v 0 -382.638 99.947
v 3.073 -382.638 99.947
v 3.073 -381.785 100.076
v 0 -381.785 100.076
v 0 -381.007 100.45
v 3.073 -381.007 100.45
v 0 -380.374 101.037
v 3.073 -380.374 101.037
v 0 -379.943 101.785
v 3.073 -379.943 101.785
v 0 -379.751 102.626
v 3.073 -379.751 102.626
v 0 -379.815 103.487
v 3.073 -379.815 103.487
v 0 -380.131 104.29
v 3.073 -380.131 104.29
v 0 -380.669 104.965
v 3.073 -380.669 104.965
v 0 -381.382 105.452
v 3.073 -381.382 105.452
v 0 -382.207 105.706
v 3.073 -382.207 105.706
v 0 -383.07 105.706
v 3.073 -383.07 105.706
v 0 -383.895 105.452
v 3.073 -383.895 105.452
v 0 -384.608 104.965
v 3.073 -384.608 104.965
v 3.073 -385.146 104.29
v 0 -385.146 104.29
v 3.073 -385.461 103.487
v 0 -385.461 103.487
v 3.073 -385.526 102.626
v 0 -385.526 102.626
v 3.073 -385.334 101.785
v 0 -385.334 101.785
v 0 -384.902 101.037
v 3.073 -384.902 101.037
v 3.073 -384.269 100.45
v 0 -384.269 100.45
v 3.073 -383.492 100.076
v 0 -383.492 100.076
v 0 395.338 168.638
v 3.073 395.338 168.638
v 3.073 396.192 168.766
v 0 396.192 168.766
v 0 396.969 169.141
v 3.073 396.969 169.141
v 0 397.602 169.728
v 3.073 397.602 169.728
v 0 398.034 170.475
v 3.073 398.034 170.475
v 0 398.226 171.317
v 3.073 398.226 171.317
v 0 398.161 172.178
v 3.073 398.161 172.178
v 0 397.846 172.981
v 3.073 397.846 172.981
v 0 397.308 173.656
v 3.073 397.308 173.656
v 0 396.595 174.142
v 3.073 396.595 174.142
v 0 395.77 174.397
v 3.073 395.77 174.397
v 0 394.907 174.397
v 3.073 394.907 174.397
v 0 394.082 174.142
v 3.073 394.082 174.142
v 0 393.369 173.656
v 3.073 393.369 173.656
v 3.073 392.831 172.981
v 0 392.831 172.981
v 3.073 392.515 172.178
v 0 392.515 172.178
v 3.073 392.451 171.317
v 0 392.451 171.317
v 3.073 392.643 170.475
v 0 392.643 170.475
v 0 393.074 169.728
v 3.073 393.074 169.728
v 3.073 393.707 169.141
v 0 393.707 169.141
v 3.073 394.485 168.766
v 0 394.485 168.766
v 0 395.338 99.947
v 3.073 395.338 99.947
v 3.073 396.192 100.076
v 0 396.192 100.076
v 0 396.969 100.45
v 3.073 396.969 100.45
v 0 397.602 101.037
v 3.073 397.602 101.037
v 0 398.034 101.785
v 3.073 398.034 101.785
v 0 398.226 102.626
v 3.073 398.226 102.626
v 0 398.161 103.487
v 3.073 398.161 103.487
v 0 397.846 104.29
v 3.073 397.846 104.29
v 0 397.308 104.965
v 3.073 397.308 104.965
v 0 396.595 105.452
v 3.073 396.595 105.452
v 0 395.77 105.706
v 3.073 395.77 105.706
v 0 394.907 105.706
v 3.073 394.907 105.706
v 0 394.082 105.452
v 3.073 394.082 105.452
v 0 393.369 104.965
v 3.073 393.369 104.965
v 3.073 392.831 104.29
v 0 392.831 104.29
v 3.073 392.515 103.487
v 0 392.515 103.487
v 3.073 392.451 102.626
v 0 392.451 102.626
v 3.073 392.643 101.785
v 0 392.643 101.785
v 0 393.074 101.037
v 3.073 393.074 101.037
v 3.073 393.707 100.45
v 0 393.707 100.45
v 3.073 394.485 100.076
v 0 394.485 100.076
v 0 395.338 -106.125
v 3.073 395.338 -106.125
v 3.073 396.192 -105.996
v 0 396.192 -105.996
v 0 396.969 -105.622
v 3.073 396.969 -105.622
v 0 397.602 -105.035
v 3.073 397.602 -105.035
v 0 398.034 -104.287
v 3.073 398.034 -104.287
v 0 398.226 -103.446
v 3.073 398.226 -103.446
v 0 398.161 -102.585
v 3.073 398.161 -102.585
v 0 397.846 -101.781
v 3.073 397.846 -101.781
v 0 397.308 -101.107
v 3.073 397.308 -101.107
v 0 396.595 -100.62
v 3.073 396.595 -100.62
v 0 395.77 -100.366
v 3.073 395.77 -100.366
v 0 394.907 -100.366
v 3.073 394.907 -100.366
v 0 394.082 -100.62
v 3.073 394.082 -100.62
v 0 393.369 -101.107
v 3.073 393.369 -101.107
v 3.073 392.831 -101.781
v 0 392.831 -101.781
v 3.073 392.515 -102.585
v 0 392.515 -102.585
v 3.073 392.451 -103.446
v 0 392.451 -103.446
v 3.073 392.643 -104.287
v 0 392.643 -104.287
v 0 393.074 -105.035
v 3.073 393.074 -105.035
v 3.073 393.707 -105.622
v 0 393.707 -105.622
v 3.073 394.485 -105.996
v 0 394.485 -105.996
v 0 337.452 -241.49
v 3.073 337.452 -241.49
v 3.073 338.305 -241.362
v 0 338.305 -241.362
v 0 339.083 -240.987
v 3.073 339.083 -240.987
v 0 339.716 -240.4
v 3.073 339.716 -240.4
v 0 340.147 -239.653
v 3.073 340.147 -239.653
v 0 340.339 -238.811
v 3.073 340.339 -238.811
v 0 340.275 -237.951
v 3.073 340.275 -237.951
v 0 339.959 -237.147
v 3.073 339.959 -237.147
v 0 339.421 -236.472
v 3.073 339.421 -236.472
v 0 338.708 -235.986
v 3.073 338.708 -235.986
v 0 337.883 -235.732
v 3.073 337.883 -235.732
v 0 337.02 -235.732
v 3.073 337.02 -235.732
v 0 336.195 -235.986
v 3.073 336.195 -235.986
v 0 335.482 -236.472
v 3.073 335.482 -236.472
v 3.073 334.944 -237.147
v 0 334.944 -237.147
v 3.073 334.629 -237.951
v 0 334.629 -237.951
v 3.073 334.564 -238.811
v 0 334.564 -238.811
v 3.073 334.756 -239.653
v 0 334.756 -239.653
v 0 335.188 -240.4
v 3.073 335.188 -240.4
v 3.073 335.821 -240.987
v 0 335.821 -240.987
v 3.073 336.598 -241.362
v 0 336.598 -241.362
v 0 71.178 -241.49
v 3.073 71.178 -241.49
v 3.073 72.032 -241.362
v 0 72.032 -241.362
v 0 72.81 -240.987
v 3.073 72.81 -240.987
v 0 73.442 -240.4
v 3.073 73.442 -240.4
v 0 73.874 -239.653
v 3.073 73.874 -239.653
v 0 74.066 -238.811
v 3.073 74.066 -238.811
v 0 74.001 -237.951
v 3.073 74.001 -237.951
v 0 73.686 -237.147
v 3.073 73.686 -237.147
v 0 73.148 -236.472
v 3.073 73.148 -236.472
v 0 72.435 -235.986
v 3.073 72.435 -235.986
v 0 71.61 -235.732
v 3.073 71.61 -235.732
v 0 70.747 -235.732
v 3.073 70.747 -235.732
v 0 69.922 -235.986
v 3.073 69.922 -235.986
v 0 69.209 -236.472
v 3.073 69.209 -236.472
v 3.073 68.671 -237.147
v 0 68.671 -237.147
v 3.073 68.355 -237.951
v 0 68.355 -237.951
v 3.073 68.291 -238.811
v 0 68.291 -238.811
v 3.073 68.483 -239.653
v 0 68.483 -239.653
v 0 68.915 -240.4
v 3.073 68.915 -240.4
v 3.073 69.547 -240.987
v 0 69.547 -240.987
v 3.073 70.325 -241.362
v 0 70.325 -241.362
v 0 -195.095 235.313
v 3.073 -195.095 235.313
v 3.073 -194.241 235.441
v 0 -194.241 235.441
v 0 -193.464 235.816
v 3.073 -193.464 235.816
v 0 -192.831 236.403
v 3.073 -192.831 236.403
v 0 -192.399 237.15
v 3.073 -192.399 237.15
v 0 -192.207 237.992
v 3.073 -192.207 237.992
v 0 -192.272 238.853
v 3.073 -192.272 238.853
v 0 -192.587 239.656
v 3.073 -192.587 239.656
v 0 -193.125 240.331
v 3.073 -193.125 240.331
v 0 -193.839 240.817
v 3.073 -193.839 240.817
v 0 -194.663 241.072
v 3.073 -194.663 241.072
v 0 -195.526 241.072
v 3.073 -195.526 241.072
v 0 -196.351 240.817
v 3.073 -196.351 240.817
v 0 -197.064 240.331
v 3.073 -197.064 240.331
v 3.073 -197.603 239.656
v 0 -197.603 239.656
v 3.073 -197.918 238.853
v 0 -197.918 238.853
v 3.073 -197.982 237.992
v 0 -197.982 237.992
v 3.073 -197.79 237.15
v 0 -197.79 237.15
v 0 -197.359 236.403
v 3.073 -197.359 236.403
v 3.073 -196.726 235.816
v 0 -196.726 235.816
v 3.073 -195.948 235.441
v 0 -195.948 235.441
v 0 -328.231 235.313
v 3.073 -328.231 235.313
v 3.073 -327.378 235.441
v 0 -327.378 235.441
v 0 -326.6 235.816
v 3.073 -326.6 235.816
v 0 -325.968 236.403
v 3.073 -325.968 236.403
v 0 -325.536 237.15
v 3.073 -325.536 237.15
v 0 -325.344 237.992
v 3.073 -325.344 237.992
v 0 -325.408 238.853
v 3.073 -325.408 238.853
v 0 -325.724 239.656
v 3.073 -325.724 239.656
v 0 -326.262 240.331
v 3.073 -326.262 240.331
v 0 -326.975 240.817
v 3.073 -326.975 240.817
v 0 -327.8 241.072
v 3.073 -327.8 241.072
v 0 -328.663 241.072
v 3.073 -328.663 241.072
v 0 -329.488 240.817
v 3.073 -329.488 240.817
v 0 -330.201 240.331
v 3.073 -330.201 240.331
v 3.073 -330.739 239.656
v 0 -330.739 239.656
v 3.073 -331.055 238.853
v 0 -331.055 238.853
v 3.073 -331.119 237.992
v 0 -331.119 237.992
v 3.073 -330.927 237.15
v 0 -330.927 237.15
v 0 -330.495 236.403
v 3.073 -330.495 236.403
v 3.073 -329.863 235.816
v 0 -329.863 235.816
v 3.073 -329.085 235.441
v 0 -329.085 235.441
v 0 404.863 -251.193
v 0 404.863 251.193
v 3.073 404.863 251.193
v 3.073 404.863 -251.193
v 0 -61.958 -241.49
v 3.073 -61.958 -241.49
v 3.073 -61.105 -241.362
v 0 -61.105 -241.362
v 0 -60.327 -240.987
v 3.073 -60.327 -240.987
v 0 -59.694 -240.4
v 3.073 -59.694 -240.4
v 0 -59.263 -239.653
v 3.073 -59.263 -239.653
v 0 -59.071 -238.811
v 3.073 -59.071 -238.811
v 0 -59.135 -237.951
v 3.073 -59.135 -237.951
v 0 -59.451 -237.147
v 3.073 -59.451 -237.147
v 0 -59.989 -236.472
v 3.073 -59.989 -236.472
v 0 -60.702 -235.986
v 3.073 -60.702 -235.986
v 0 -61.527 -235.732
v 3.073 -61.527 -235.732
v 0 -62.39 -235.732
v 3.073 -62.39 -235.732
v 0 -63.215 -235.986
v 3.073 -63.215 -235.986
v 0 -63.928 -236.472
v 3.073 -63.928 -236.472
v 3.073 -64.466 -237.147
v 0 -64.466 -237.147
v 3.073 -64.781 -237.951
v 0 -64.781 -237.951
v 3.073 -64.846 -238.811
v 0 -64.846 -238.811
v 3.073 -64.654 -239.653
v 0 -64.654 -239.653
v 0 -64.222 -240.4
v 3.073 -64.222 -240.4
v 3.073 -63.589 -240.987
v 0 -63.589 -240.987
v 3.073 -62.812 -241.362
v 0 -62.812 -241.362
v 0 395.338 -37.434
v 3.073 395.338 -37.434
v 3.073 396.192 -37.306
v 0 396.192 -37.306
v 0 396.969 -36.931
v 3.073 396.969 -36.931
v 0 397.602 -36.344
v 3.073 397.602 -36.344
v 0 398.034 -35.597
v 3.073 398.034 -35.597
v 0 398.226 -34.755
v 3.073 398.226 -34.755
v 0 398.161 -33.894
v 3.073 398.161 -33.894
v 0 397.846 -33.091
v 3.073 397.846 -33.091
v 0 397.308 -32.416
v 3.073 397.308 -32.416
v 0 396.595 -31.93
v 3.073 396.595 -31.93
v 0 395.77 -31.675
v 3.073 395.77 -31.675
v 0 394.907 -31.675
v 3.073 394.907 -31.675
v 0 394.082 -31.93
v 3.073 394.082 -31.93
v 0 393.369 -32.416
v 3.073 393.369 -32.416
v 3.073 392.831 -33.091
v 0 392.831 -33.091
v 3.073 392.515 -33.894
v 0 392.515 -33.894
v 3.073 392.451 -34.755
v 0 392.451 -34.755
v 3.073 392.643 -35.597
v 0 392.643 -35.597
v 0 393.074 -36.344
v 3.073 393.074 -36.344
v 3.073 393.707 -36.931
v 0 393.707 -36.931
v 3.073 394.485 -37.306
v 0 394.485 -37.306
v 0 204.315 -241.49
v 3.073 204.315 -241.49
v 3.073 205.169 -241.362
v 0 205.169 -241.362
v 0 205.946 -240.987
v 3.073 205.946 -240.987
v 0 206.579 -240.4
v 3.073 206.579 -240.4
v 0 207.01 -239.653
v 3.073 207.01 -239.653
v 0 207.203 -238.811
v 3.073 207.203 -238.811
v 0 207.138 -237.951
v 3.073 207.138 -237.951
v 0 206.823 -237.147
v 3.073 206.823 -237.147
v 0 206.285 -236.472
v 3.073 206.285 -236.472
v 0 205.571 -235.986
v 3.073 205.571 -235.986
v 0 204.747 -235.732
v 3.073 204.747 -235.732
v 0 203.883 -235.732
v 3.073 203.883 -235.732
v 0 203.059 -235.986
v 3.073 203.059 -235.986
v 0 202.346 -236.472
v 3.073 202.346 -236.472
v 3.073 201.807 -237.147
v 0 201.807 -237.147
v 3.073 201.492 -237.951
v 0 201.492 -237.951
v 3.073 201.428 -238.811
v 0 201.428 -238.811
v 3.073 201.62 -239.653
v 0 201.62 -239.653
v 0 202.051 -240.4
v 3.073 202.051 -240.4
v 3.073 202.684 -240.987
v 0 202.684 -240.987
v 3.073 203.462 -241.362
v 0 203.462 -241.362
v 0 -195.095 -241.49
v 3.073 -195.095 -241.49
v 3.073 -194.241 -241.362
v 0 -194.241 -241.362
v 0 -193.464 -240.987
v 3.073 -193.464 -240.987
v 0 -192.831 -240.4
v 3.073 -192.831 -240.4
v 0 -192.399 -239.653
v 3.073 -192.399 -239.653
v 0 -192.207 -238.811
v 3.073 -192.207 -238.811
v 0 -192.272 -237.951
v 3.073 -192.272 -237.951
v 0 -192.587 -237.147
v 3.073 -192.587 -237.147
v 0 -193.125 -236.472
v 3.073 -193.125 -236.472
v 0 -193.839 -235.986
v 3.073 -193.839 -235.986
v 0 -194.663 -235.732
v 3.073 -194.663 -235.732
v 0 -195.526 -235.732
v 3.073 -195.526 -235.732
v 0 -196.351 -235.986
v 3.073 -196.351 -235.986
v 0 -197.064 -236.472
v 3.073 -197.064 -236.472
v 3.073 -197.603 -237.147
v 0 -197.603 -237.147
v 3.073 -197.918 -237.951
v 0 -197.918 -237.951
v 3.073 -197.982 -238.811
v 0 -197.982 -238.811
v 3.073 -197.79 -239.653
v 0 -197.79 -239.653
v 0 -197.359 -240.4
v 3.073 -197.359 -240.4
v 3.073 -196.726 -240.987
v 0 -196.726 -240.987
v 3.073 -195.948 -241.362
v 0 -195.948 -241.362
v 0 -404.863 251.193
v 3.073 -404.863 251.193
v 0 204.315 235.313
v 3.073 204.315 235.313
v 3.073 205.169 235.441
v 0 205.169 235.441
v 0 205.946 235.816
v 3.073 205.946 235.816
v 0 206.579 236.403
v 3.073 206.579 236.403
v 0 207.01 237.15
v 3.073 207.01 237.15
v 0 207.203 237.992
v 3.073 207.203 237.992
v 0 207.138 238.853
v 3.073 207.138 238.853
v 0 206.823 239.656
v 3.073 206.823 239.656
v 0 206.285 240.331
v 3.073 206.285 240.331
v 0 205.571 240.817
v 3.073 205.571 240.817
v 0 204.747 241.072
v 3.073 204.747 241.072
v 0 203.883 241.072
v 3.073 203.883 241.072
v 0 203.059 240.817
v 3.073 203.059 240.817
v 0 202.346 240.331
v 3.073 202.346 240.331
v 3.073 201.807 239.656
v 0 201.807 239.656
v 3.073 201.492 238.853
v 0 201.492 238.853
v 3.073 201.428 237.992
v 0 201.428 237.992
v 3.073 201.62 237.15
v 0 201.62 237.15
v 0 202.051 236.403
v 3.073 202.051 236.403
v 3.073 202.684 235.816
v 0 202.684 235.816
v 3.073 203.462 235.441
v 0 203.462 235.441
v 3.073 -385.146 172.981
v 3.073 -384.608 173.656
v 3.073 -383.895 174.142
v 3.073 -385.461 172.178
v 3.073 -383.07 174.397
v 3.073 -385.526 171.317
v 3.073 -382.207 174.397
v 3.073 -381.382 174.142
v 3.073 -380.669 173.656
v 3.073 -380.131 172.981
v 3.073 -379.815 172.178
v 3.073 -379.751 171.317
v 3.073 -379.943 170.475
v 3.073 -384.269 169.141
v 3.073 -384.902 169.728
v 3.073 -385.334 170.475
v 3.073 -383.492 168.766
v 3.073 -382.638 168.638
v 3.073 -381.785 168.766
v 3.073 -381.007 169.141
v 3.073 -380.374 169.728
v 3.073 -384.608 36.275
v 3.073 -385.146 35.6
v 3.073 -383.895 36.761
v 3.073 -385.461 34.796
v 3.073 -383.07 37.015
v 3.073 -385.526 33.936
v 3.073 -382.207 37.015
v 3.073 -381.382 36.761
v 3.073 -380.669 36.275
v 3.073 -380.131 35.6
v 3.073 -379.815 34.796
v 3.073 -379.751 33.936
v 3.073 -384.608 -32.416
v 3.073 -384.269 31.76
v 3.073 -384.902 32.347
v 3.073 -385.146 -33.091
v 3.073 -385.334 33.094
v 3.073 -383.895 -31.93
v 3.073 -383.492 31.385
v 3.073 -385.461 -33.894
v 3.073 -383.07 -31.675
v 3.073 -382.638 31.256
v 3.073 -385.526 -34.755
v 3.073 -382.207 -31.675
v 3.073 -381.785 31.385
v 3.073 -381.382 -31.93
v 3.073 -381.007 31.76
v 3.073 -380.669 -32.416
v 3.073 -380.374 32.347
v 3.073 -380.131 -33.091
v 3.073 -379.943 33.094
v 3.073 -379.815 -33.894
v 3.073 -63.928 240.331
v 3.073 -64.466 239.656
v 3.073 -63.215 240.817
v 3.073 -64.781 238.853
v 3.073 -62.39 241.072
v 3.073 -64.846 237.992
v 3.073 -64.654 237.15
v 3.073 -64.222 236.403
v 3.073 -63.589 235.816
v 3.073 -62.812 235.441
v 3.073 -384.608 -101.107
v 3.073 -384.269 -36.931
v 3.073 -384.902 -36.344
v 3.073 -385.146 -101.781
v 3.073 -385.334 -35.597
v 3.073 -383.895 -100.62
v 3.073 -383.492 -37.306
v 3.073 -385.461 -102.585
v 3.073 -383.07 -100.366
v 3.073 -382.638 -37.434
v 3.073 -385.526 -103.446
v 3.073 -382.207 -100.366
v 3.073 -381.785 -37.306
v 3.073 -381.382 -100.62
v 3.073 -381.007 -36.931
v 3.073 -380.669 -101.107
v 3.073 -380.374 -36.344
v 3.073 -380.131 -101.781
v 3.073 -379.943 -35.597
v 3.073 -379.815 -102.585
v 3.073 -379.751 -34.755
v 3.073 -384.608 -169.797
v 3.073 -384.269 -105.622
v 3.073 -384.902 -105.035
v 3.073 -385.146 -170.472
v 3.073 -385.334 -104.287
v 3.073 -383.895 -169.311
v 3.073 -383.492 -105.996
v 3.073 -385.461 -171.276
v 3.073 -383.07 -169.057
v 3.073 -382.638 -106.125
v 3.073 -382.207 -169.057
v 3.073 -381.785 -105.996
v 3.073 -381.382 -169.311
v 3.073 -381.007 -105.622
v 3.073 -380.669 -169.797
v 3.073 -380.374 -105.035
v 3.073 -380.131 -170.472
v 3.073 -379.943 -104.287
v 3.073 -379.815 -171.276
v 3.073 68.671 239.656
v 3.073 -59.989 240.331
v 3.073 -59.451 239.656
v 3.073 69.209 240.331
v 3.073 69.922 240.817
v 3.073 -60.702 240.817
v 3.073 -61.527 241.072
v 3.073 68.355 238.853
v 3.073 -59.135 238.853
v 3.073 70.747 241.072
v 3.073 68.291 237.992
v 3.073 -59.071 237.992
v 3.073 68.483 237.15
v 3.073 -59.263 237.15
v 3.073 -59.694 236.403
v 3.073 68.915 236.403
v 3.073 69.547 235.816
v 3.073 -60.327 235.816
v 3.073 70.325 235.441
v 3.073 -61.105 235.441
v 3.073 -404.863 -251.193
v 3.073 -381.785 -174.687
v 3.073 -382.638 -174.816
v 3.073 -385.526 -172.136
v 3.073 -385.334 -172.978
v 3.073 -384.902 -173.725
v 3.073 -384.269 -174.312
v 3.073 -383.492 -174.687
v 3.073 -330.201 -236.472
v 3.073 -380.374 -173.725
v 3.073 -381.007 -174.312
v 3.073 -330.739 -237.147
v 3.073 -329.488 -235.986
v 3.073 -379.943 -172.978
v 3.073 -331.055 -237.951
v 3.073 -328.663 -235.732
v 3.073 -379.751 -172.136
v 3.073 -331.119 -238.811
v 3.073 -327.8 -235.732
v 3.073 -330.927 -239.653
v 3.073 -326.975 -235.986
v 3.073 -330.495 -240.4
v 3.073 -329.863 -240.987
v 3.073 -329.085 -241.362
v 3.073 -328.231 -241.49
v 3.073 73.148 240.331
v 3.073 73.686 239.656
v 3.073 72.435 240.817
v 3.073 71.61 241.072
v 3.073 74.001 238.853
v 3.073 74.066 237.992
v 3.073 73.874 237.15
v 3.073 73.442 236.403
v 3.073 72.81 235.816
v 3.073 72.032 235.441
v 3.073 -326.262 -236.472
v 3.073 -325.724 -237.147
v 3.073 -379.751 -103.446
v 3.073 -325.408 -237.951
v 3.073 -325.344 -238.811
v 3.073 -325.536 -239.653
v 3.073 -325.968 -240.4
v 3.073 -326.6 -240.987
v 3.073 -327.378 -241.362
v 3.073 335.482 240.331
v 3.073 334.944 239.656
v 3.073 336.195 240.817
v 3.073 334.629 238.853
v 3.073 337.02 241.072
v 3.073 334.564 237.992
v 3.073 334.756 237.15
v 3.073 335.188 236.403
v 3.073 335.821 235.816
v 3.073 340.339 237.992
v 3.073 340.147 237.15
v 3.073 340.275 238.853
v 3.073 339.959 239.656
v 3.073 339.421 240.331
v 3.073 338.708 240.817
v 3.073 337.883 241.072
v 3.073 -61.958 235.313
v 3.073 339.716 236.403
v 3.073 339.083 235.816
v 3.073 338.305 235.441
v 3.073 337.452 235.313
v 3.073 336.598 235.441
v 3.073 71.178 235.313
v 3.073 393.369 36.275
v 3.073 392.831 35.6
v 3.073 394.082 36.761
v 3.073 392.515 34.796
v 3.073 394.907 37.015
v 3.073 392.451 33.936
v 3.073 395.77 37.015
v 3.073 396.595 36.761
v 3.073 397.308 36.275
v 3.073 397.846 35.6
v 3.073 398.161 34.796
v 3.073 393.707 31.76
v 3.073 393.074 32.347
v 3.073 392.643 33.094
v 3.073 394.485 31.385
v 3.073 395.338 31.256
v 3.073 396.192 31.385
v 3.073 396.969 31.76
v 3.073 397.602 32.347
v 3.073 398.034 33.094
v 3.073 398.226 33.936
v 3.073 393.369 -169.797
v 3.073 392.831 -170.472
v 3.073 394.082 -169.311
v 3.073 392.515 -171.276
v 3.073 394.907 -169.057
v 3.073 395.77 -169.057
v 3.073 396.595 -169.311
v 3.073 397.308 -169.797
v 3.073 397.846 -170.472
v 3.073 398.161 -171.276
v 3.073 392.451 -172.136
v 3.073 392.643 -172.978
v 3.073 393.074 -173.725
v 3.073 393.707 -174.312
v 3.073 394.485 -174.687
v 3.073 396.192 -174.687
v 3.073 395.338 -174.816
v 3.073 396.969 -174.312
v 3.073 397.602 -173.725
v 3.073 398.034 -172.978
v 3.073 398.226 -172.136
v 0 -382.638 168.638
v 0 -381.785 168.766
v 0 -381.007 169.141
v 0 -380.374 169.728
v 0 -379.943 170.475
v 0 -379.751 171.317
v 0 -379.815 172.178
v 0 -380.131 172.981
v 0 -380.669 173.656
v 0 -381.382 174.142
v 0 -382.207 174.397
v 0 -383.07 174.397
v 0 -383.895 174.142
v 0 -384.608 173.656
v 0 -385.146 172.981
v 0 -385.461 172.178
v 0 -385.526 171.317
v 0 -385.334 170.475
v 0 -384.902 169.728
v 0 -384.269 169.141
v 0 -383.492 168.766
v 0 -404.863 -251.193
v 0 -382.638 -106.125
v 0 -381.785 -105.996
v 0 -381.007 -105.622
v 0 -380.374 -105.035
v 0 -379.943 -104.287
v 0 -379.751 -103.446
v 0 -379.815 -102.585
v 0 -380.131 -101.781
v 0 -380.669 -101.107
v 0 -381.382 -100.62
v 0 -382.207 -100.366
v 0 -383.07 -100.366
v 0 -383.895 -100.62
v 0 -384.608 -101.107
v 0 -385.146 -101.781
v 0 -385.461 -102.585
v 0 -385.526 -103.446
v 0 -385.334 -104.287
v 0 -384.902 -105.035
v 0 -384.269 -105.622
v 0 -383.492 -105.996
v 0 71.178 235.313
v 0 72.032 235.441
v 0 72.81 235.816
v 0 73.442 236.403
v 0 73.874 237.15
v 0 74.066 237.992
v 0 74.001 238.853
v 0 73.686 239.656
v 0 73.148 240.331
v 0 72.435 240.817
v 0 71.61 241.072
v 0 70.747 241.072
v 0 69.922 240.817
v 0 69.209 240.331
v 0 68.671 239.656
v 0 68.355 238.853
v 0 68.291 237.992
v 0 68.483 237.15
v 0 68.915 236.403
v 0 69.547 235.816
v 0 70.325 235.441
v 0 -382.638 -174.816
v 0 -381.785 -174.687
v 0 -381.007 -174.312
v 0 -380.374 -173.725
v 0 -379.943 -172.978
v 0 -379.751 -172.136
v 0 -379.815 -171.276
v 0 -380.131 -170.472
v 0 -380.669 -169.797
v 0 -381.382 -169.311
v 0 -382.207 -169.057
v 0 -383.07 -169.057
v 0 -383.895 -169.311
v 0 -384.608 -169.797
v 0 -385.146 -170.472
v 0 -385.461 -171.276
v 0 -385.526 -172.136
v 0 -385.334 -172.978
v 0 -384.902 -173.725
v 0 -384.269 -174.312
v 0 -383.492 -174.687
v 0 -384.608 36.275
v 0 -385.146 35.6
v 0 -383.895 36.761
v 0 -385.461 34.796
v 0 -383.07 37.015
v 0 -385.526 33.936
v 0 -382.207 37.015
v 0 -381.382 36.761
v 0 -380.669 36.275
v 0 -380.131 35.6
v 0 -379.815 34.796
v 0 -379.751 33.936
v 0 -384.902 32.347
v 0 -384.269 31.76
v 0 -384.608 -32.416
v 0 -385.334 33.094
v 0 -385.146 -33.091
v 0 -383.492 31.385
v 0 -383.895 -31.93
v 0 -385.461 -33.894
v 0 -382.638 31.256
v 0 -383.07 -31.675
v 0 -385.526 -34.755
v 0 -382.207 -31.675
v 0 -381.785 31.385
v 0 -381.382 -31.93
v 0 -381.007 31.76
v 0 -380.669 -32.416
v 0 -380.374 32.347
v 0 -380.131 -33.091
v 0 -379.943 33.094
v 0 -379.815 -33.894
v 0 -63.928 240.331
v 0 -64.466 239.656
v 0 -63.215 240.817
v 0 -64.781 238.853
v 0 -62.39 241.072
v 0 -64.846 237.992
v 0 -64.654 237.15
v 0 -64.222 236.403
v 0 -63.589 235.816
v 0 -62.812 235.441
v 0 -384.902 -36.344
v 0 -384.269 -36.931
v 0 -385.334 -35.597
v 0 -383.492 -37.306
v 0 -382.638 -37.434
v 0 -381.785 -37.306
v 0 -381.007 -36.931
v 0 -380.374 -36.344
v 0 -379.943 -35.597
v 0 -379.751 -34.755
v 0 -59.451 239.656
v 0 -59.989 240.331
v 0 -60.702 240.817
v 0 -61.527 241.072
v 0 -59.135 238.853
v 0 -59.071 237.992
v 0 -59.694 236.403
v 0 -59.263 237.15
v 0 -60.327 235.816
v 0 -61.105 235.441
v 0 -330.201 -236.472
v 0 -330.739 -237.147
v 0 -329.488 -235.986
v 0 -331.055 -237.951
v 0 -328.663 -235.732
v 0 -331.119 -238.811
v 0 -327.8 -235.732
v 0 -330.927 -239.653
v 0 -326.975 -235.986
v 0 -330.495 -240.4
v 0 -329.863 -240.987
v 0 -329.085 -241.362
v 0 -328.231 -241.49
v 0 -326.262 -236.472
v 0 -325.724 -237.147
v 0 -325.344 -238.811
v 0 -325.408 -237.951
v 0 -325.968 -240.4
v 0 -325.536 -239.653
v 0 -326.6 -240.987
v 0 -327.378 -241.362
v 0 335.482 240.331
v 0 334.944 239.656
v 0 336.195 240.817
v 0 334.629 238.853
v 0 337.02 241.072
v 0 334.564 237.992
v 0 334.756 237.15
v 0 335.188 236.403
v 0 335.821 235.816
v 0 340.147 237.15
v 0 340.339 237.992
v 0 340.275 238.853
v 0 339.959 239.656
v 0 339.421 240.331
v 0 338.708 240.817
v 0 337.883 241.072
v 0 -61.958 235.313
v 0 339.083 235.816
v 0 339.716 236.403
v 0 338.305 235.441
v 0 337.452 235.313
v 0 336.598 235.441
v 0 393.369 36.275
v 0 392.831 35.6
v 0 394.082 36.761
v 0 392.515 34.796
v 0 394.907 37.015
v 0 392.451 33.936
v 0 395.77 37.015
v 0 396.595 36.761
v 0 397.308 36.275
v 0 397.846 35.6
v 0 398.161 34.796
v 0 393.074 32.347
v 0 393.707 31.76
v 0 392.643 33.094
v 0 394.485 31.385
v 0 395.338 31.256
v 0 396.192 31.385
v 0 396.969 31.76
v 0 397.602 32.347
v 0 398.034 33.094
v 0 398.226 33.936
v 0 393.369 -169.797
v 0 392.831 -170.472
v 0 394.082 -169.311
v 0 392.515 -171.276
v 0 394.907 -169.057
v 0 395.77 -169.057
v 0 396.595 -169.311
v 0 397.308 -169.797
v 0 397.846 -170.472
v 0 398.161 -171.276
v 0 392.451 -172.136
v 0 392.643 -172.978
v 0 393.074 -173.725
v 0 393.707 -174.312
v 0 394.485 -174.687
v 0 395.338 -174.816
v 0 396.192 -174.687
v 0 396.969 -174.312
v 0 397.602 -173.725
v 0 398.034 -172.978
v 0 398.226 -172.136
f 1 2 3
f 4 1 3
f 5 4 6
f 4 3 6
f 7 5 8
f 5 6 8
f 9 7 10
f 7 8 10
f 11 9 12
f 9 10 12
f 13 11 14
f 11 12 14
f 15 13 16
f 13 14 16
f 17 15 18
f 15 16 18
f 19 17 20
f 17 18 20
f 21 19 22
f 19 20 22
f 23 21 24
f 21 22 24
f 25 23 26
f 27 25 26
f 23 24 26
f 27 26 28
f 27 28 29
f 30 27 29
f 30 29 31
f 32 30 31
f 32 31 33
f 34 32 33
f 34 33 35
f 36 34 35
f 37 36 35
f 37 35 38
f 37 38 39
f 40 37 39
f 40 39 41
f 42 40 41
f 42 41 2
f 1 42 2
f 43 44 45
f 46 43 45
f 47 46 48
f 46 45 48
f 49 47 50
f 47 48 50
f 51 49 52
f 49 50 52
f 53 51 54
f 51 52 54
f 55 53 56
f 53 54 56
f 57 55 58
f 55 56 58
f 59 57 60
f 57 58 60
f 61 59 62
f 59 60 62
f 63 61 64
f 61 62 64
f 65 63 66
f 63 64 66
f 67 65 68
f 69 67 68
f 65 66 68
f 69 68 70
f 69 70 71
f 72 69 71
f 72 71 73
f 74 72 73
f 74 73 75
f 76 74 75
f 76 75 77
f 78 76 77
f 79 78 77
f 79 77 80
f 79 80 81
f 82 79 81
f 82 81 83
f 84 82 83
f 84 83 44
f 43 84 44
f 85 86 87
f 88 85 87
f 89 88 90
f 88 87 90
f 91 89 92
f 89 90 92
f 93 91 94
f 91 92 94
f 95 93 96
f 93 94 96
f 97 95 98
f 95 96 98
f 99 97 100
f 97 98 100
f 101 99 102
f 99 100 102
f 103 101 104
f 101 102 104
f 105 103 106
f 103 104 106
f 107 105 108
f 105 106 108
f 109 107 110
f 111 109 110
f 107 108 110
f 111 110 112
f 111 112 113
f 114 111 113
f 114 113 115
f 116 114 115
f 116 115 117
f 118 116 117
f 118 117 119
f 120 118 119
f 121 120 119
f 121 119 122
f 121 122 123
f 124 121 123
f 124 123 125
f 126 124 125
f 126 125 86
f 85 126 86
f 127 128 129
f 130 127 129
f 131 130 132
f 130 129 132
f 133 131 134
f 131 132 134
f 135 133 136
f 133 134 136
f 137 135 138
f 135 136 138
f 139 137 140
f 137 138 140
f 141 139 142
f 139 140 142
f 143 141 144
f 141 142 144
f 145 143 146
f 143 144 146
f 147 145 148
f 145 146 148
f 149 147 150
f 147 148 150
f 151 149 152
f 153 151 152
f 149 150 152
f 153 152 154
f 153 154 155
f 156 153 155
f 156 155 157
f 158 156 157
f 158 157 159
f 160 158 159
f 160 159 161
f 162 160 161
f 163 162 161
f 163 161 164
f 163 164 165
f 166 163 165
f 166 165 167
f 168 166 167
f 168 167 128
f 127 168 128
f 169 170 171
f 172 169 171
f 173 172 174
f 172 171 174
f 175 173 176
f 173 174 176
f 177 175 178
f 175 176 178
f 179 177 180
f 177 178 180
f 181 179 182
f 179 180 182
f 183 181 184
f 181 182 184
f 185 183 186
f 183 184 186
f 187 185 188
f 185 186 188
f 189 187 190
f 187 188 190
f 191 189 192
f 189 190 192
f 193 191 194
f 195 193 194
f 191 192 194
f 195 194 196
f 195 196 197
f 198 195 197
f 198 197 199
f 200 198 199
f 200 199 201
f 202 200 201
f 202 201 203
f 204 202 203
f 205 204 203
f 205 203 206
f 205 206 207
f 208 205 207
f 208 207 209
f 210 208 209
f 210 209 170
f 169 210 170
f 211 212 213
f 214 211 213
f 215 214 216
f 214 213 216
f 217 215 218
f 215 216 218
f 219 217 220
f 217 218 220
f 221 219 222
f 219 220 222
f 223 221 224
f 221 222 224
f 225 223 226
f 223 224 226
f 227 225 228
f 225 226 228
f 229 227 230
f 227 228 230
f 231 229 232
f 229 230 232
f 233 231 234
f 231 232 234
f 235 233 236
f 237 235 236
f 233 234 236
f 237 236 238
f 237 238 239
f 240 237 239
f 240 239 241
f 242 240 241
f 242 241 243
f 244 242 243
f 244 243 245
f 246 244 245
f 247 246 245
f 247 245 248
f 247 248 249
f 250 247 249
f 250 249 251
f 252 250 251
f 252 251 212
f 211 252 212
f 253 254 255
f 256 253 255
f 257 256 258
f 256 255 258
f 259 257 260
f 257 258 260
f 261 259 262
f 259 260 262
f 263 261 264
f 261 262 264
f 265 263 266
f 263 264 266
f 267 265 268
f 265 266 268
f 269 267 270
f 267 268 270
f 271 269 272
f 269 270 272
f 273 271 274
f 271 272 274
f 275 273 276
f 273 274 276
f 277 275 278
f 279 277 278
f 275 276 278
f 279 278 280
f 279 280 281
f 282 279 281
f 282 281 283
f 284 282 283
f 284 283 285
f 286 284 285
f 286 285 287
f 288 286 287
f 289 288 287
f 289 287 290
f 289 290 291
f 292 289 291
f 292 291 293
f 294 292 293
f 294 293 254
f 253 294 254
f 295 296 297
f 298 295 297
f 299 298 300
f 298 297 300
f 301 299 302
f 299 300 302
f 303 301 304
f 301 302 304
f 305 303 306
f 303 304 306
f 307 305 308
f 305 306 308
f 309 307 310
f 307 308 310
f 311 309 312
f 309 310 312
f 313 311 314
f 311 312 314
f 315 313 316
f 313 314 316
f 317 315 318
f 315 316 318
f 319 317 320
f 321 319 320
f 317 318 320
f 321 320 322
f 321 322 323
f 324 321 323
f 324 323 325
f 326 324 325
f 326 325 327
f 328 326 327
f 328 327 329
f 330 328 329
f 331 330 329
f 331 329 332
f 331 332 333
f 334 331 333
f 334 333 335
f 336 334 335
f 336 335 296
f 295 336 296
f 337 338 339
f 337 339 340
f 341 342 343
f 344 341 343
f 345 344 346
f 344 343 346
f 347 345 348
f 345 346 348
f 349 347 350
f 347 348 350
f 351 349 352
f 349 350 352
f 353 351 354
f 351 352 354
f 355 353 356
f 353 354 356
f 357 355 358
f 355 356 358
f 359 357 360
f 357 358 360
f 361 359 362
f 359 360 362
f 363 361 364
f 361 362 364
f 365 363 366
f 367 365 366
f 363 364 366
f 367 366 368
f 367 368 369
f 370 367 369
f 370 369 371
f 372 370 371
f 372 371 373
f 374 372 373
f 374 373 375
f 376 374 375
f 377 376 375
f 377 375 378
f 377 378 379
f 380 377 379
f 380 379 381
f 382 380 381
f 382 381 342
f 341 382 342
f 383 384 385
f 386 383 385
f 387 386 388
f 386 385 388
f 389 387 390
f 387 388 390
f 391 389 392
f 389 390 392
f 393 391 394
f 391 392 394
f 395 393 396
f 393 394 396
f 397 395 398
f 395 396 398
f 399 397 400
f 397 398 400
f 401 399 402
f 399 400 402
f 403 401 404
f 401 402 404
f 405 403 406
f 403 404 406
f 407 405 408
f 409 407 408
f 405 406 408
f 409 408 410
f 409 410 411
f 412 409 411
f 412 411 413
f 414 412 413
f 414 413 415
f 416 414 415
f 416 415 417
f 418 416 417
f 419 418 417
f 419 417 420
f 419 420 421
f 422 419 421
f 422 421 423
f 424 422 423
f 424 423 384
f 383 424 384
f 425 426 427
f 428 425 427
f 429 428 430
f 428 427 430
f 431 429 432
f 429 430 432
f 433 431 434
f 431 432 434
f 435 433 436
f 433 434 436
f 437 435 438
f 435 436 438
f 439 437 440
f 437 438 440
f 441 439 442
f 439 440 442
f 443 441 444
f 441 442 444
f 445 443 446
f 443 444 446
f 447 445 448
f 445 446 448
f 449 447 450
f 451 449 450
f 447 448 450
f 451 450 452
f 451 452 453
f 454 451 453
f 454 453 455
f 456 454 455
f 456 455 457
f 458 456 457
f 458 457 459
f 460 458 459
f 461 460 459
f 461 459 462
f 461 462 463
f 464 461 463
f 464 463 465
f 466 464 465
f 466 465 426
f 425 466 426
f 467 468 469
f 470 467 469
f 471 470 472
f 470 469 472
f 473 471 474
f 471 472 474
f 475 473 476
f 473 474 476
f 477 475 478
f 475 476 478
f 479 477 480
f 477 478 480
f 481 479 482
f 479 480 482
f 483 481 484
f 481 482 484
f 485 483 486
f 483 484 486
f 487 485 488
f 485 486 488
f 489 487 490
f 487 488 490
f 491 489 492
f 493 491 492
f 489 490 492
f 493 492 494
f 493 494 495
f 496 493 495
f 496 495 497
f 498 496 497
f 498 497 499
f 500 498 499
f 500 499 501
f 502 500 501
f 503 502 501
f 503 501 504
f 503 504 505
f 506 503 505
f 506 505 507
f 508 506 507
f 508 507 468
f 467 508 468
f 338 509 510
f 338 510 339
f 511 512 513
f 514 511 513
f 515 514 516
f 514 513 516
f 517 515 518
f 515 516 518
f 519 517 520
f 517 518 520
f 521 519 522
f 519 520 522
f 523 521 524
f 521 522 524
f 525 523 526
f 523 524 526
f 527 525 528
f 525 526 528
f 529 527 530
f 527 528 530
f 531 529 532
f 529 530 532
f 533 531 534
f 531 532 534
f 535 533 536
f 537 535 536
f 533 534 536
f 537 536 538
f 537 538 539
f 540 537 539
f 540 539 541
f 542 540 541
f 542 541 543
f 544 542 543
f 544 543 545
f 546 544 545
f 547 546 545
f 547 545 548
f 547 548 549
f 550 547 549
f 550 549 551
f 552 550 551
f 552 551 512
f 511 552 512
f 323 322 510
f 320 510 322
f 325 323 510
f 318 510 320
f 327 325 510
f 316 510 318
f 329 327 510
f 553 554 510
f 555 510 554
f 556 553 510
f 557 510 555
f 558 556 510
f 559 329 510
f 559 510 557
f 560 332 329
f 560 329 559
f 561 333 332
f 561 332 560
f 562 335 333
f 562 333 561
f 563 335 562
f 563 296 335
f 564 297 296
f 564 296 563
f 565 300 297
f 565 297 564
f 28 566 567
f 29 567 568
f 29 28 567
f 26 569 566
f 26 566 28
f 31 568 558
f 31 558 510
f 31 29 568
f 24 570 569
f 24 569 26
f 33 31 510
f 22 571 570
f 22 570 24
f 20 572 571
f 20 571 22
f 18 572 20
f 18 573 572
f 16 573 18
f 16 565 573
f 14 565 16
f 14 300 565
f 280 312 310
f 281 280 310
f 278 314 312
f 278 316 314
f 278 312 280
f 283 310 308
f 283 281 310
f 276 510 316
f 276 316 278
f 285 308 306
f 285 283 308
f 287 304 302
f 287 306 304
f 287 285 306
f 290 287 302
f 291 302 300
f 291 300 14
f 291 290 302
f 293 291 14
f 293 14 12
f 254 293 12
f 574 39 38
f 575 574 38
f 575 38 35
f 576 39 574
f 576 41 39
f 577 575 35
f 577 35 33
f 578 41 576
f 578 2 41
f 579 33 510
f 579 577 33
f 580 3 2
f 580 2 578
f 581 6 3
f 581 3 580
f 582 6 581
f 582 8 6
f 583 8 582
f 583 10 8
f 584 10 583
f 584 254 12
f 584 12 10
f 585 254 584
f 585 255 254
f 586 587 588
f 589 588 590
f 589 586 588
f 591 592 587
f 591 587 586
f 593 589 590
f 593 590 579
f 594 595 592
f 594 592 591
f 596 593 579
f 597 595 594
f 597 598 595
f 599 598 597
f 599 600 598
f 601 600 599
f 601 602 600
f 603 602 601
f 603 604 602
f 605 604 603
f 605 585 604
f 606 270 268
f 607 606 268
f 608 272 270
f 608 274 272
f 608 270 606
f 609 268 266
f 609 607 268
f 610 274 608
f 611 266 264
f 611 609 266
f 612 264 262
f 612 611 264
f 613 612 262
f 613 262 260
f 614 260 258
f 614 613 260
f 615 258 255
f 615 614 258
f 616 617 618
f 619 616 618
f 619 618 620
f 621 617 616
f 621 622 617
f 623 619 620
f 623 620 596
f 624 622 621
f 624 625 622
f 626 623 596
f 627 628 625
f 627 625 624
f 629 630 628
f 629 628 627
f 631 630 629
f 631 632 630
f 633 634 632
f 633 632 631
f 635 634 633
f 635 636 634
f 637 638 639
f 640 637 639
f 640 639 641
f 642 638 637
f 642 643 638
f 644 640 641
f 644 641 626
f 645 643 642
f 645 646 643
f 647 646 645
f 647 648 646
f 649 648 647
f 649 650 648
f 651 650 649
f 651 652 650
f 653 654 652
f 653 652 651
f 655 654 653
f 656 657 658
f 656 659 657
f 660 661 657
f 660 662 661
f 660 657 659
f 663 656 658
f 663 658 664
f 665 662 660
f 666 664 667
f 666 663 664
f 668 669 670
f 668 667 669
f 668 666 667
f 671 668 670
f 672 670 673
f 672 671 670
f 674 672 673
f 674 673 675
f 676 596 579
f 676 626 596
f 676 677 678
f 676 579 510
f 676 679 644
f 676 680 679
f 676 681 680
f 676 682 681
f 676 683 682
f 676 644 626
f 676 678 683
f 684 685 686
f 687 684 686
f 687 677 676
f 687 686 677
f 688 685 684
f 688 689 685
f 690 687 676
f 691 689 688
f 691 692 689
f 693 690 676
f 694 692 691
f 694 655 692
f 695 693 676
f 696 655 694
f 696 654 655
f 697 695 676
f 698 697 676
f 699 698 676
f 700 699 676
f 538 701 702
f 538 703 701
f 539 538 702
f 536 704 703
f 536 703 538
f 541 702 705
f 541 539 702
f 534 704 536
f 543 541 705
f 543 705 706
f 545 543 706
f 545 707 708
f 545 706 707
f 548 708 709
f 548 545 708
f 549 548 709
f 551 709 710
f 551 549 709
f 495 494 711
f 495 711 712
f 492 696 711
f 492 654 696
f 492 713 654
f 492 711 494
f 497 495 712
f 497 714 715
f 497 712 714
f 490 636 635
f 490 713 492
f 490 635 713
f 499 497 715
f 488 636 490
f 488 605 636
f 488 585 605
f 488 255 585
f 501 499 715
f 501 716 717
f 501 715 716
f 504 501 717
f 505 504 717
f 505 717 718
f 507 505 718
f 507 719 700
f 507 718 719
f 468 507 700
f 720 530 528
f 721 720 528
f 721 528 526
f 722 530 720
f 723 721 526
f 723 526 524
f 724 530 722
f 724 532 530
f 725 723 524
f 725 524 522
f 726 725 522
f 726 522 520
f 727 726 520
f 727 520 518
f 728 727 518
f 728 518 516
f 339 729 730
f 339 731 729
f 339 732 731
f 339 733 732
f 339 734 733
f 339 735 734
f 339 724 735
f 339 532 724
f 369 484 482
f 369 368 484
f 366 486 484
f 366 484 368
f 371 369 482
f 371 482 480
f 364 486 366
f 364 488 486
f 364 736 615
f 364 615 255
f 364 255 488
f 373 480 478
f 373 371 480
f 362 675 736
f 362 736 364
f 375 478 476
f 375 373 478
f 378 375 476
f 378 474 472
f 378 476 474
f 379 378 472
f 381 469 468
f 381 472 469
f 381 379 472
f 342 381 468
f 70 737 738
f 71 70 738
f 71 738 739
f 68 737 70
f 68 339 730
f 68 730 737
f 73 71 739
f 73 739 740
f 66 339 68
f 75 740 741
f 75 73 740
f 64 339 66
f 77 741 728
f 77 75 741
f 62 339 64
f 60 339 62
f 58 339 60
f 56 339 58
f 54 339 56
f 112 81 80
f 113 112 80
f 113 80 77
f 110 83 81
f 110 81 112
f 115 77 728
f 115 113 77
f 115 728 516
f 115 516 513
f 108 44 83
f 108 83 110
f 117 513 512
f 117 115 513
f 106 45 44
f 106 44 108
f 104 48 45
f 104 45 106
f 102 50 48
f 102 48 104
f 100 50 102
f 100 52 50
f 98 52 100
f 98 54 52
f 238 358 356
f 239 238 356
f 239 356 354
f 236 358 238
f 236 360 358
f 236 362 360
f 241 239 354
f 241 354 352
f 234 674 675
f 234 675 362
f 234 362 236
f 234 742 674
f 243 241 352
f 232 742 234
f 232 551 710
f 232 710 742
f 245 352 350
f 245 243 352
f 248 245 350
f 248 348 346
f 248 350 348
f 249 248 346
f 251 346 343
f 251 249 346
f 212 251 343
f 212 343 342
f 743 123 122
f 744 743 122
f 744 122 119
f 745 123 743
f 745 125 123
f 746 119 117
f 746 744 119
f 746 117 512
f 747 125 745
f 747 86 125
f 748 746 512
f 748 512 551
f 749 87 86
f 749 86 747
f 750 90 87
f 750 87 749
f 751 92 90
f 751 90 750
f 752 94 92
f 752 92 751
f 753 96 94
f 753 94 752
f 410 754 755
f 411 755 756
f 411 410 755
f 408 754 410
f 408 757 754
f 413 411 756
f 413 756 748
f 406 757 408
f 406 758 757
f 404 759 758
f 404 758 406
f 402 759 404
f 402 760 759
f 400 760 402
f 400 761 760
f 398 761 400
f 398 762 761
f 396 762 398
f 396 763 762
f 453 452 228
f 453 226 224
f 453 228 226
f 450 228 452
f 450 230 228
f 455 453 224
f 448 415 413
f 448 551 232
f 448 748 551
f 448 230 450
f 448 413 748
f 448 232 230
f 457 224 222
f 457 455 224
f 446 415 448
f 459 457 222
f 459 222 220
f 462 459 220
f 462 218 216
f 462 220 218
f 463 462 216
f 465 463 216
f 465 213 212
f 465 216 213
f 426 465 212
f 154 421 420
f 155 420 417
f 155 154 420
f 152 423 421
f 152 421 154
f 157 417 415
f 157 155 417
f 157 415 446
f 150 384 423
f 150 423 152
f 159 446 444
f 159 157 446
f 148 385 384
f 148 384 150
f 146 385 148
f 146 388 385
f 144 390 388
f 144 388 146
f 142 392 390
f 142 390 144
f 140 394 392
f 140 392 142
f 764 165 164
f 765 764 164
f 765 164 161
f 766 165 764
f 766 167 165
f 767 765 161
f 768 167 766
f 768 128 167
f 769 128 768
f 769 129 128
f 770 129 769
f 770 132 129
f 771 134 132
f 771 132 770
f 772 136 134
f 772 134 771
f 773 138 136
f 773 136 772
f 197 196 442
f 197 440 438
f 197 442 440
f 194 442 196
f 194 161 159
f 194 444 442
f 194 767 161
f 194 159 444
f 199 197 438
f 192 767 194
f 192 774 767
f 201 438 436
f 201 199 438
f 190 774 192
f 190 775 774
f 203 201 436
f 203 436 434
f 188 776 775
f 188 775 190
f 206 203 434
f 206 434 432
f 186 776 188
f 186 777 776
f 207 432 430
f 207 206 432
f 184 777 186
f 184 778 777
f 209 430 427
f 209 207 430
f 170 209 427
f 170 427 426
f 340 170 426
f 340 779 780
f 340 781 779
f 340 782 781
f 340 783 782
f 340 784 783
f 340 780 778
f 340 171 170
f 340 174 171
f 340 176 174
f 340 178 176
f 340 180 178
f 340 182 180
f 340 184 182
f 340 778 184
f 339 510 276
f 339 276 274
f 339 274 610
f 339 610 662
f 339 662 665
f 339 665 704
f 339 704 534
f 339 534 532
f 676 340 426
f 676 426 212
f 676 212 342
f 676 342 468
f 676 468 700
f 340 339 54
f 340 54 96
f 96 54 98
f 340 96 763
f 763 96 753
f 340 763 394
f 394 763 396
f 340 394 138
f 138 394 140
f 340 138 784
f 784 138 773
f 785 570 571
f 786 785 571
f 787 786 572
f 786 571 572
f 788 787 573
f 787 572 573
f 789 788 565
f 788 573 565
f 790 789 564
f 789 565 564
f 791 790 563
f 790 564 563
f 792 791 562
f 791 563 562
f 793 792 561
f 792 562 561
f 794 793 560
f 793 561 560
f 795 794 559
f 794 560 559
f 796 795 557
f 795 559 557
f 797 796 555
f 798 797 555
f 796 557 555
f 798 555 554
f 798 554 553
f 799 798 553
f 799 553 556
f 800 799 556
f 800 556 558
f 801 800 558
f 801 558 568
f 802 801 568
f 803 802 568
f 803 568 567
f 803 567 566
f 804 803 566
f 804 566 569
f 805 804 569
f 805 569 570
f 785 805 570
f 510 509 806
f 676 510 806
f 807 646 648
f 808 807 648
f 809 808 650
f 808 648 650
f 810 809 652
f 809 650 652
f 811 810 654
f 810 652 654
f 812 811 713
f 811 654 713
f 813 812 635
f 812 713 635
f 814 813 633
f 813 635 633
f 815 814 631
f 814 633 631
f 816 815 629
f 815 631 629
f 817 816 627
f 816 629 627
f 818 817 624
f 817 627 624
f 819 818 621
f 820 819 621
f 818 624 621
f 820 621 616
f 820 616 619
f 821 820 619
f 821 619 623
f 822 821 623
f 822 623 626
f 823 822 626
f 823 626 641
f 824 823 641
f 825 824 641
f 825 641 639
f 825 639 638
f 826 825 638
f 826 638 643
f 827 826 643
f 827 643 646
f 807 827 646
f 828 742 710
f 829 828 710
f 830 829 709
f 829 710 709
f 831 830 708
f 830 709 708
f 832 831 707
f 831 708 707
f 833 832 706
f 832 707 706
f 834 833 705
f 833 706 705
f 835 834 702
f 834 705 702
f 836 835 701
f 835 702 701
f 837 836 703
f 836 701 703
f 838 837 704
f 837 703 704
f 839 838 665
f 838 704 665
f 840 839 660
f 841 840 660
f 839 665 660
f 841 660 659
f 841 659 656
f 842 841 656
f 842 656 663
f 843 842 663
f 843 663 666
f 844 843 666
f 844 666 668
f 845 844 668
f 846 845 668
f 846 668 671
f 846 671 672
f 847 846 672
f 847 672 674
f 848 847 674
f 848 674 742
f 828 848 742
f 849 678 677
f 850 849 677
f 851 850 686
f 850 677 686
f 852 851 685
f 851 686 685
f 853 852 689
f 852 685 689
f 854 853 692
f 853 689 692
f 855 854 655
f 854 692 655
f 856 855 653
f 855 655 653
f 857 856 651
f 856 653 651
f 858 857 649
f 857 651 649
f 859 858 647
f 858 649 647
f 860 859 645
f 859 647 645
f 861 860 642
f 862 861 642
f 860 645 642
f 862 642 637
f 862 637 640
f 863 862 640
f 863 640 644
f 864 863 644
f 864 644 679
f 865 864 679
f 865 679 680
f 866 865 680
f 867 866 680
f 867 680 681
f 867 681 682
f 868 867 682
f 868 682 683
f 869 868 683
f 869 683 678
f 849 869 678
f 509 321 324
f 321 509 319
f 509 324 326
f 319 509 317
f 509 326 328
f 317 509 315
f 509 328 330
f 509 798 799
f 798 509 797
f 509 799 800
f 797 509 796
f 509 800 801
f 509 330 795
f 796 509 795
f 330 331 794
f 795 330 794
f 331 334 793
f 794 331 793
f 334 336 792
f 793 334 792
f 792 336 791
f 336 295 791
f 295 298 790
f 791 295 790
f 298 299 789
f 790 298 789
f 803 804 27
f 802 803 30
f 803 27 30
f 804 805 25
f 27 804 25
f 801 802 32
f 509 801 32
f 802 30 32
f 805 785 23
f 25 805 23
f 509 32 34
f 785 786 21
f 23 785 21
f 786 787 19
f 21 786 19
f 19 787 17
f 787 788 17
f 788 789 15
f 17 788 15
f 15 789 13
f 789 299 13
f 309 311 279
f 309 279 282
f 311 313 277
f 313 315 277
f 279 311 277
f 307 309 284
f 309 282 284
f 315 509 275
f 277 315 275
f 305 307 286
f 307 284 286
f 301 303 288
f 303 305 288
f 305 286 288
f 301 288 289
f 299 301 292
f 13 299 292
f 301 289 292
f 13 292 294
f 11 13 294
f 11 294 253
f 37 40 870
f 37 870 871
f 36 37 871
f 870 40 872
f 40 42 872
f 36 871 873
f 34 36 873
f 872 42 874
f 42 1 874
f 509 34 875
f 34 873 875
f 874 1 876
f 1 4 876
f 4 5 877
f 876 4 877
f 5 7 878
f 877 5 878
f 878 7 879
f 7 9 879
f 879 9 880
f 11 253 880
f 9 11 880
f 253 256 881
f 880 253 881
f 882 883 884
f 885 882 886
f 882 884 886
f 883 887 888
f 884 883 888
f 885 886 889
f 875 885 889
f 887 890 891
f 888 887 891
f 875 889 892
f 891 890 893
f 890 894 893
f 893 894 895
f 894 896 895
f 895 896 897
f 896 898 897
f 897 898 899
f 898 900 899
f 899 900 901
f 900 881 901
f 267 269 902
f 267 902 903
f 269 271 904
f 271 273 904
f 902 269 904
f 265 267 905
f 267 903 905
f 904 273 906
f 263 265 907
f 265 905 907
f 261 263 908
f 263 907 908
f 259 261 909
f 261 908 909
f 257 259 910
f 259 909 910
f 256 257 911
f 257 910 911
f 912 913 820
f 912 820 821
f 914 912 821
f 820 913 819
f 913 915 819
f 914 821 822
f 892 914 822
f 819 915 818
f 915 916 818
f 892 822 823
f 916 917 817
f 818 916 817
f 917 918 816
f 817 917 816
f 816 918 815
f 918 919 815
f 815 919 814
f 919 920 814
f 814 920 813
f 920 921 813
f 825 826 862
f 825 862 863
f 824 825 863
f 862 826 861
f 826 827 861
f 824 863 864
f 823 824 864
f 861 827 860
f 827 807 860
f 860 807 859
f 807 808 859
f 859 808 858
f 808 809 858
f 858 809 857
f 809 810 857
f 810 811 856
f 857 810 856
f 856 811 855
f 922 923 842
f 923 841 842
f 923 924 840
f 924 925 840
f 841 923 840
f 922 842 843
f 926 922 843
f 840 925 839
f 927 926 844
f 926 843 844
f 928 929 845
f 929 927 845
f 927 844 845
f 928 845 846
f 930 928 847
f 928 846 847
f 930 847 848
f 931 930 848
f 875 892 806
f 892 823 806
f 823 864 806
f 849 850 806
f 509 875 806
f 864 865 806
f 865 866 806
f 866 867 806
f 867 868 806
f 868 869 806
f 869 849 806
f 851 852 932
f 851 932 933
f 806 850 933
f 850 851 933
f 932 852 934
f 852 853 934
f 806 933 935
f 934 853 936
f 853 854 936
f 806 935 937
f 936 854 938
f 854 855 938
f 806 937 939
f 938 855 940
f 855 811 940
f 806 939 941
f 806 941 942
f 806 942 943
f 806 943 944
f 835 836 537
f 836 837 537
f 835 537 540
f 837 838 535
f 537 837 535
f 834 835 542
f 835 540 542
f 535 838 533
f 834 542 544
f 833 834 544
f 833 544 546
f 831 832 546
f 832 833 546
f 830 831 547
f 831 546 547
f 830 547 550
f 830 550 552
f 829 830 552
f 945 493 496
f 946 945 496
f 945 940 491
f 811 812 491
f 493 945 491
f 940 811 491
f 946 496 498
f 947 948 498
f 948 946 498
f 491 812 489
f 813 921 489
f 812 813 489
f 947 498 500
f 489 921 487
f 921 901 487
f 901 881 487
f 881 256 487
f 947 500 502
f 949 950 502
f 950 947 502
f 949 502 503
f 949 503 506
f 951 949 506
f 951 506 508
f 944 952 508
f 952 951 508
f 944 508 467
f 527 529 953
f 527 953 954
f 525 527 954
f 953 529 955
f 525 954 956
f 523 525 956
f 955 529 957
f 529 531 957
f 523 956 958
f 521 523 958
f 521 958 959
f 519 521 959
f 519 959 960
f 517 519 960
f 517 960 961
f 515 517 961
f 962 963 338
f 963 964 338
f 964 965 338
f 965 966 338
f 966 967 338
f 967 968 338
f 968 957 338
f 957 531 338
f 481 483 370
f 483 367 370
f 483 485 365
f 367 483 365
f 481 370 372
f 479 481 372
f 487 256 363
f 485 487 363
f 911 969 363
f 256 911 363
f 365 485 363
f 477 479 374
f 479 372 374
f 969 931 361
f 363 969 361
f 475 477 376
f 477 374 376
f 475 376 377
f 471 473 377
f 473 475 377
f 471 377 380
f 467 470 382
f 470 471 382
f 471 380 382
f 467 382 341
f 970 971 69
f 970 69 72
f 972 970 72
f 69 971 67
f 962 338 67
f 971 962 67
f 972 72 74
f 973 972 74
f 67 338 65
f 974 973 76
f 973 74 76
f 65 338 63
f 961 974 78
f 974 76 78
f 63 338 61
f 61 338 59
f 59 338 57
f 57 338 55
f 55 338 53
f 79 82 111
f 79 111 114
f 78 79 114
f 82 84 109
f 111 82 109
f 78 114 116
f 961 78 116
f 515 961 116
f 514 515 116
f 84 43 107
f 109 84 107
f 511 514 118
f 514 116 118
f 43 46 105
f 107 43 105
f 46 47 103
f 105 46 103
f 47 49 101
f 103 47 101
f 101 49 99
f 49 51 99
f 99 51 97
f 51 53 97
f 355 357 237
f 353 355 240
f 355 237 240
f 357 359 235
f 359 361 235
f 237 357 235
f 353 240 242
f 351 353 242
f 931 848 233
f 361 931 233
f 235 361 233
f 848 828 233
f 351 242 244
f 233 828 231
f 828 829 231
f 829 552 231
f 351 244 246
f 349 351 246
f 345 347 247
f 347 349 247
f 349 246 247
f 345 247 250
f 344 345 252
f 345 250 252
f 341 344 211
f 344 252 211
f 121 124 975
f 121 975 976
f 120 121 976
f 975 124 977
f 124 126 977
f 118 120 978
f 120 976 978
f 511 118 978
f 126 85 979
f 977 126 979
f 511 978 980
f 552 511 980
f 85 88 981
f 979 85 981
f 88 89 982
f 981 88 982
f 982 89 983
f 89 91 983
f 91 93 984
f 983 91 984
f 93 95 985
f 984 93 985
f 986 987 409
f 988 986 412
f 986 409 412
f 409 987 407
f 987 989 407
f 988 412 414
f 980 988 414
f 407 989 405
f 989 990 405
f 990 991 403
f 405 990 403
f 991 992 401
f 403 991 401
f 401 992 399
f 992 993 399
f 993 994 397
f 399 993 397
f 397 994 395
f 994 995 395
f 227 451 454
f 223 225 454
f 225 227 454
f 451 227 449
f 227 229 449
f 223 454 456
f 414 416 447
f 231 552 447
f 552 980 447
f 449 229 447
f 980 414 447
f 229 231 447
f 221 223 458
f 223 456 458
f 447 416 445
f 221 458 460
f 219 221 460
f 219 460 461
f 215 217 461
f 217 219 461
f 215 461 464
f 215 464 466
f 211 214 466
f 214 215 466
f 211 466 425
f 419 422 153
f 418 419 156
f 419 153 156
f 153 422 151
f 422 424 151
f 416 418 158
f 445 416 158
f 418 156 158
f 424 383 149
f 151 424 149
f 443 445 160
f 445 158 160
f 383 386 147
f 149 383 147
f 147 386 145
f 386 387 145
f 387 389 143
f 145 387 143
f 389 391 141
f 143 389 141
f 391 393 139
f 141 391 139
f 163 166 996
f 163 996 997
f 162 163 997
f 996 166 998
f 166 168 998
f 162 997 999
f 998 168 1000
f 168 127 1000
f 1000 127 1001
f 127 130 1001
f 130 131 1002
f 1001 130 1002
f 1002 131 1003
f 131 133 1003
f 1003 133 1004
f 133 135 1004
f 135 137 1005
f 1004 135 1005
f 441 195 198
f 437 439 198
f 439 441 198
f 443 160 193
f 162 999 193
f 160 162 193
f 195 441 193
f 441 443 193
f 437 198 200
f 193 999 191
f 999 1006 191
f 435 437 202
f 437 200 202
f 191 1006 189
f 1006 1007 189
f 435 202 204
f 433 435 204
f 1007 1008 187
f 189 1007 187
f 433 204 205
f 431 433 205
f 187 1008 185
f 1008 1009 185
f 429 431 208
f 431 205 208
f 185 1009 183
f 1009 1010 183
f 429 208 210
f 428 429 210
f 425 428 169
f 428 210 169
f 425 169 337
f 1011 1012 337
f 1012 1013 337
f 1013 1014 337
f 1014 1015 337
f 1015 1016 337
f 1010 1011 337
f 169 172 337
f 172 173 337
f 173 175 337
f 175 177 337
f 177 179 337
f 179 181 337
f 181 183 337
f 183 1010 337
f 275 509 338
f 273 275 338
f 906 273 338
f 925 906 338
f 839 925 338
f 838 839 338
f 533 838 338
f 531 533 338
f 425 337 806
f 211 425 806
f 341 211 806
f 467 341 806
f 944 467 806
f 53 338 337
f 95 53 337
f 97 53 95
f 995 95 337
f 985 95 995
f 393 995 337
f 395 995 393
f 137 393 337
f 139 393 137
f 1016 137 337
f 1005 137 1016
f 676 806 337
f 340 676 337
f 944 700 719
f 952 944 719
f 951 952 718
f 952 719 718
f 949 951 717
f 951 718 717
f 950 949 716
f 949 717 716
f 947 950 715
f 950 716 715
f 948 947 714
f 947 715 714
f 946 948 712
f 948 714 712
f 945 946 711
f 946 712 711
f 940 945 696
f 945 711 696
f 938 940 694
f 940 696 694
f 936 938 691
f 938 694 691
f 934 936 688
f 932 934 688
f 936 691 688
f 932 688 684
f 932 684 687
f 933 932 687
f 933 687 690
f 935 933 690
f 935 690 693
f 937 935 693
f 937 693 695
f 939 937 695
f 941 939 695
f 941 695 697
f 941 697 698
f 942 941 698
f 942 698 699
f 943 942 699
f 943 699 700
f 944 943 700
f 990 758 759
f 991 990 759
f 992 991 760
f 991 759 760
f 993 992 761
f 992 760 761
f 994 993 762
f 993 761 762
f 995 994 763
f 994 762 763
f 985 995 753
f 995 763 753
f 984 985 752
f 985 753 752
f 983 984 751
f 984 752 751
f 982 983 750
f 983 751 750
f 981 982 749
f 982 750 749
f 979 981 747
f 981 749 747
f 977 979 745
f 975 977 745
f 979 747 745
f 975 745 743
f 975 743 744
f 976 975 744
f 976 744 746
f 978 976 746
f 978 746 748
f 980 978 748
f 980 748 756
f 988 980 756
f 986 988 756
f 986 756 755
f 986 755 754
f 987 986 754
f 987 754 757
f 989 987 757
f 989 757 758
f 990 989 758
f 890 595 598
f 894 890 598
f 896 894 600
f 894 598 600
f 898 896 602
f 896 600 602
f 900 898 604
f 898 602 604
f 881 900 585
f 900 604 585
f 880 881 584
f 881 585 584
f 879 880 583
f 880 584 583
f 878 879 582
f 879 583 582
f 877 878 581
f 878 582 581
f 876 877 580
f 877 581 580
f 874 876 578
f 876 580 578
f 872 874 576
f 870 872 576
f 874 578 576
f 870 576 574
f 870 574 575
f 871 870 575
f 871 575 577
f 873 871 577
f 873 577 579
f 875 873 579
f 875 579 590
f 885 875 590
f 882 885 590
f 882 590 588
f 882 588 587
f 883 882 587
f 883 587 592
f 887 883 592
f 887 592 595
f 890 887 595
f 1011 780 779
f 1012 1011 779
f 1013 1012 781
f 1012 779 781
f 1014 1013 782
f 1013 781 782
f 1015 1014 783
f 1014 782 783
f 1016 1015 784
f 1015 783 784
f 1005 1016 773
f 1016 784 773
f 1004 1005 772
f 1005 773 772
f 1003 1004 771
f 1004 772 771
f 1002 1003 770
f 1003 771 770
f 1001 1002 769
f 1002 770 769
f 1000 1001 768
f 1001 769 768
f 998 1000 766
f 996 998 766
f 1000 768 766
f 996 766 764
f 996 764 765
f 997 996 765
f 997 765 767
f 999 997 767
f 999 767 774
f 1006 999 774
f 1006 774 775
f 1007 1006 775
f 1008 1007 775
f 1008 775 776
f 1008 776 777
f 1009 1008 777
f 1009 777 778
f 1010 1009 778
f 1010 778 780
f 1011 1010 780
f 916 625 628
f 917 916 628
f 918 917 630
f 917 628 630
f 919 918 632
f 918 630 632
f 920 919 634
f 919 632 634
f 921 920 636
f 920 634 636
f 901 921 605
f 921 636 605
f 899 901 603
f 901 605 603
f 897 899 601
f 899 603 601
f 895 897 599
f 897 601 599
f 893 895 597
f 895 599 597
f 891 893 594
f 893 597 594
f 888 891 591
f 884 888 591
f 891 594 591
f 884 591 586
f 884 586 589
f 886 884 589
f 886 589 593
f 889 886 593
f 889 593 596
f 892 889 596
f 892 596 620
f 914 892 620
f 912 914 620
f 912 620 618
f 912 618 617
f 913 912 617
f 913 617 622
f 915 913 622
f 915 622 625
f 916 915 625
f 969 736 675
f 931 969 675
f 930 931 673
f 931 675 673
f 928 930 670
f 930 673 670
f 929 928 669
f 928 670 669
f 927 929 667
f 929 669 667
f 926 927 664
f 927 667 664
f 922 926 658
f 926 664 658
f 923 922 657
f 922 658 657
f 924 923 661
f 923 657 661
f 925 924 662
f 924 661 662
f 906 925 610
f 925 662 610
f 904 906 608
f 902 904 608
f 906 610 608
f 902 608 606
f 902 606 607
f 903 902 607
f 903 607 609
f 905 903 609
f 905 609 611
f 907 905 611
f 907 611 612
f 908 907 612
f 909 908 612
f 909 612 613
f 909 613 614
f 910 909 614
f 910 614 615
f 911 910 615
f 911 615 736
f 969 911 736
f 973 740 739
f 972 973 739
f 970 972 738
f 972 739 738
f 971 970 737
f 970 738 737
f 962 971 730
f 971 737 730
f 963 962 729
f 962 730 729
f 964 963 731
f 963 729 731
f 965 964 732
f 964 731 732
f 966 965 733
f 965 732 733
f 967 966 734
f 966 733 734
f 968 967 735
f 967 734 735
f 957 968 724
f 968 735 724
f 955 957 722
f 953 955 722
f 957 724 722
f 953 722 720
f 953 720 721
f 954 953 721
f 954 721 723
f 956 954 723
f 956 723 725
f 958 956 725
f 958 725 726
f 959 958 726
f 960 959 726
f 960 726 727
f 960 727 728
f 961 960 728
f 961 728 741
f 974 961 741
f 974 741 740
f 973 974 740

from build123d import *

# Parameters (mm, degrees)
SKETCH1_W                 = 502.3866
SKETCH1_H                 = 809.7266
SIDEPANEL_DEPTH           = 3.0734
SKETCH2_R                 = 2.8956
TOPBOTTOMHOLEMASTER_DEPTH = 477.468059202
LPATTERN1_COUNT           = 6
LPATTERN1_PITCH           = 68.690639962
SKETCH3_R                 = 2.8956
REARHOLESMASTER_DEPTH     = 477.468059202
LPATTERN2_COUNT           = 6
LPATTERN2_PITCH           = 133.13664


with BuildPart() as part:
    # Sketch1 → SidePanel (new body)
    with BuildSketch(Plane(origin=(0, 0, 0), x_dir=(0, 0, -1), z_dir=(1, 0, 0))):
        Rectangle(SKETCH1_W, SKETCH1_H)
    extrude(amount=SIDEPANEL_DEPTH)

    # Sketch2 → TopBottomHoleMaster (cut, through all)
    with BuildSketch(Plane(origin=(3.0734, 0, 0), x_dir=(0, 0, -1), z_dir=(1, 0, 0))):
        with Locations((171.9199, 395.3383)):
            Circle(SKETCH2_R)
        with Locations((171.9199, -382.6383)):
            Circle(SKETCH2_R)
    topbottomholemaster = extrude(amount=-TOPBOTTOMHOLEMASTER_DEPTH, mode=Mode.SUBTRACT)

    # LPattern1: TopBottomHoleMaster ×6
    with Locations(*[(0, 0, i * LPATTERN1_PITCH) for i in range(1, LPATTERN1_COUNT)]):
        add(topbottomholemaster, mode=Mode.SUBTRACT)

    # Sketch3 → RearHolesMaster (cut, through all)
    with BuildSketch(Plane(origin=(3.0734, 0, 0), x_dir=(0, 0, -1), z_dir=(1, 0, 0))):
        with Locations((-238.208299808, 337.4517)):
            Circle(SKETCH3_R)
        with Locations((238.5949, 337.4517)):
            Circle(SKETCH3_R)
    rearholesmaster = extrude(amount=-REARHOLESMASTER_DEPTH, mode=Mode.SUBTRACT)

    # LPattern2: RearHolesMaster ×6
    with Locations(*[(0, -i * LPATTERN2_PITCH, 0) for i in range(1, LPATTERN2_COUNT)]):
        add(rearholesmaster, mode=Mode.SUBTRACT)


solid = part.part
